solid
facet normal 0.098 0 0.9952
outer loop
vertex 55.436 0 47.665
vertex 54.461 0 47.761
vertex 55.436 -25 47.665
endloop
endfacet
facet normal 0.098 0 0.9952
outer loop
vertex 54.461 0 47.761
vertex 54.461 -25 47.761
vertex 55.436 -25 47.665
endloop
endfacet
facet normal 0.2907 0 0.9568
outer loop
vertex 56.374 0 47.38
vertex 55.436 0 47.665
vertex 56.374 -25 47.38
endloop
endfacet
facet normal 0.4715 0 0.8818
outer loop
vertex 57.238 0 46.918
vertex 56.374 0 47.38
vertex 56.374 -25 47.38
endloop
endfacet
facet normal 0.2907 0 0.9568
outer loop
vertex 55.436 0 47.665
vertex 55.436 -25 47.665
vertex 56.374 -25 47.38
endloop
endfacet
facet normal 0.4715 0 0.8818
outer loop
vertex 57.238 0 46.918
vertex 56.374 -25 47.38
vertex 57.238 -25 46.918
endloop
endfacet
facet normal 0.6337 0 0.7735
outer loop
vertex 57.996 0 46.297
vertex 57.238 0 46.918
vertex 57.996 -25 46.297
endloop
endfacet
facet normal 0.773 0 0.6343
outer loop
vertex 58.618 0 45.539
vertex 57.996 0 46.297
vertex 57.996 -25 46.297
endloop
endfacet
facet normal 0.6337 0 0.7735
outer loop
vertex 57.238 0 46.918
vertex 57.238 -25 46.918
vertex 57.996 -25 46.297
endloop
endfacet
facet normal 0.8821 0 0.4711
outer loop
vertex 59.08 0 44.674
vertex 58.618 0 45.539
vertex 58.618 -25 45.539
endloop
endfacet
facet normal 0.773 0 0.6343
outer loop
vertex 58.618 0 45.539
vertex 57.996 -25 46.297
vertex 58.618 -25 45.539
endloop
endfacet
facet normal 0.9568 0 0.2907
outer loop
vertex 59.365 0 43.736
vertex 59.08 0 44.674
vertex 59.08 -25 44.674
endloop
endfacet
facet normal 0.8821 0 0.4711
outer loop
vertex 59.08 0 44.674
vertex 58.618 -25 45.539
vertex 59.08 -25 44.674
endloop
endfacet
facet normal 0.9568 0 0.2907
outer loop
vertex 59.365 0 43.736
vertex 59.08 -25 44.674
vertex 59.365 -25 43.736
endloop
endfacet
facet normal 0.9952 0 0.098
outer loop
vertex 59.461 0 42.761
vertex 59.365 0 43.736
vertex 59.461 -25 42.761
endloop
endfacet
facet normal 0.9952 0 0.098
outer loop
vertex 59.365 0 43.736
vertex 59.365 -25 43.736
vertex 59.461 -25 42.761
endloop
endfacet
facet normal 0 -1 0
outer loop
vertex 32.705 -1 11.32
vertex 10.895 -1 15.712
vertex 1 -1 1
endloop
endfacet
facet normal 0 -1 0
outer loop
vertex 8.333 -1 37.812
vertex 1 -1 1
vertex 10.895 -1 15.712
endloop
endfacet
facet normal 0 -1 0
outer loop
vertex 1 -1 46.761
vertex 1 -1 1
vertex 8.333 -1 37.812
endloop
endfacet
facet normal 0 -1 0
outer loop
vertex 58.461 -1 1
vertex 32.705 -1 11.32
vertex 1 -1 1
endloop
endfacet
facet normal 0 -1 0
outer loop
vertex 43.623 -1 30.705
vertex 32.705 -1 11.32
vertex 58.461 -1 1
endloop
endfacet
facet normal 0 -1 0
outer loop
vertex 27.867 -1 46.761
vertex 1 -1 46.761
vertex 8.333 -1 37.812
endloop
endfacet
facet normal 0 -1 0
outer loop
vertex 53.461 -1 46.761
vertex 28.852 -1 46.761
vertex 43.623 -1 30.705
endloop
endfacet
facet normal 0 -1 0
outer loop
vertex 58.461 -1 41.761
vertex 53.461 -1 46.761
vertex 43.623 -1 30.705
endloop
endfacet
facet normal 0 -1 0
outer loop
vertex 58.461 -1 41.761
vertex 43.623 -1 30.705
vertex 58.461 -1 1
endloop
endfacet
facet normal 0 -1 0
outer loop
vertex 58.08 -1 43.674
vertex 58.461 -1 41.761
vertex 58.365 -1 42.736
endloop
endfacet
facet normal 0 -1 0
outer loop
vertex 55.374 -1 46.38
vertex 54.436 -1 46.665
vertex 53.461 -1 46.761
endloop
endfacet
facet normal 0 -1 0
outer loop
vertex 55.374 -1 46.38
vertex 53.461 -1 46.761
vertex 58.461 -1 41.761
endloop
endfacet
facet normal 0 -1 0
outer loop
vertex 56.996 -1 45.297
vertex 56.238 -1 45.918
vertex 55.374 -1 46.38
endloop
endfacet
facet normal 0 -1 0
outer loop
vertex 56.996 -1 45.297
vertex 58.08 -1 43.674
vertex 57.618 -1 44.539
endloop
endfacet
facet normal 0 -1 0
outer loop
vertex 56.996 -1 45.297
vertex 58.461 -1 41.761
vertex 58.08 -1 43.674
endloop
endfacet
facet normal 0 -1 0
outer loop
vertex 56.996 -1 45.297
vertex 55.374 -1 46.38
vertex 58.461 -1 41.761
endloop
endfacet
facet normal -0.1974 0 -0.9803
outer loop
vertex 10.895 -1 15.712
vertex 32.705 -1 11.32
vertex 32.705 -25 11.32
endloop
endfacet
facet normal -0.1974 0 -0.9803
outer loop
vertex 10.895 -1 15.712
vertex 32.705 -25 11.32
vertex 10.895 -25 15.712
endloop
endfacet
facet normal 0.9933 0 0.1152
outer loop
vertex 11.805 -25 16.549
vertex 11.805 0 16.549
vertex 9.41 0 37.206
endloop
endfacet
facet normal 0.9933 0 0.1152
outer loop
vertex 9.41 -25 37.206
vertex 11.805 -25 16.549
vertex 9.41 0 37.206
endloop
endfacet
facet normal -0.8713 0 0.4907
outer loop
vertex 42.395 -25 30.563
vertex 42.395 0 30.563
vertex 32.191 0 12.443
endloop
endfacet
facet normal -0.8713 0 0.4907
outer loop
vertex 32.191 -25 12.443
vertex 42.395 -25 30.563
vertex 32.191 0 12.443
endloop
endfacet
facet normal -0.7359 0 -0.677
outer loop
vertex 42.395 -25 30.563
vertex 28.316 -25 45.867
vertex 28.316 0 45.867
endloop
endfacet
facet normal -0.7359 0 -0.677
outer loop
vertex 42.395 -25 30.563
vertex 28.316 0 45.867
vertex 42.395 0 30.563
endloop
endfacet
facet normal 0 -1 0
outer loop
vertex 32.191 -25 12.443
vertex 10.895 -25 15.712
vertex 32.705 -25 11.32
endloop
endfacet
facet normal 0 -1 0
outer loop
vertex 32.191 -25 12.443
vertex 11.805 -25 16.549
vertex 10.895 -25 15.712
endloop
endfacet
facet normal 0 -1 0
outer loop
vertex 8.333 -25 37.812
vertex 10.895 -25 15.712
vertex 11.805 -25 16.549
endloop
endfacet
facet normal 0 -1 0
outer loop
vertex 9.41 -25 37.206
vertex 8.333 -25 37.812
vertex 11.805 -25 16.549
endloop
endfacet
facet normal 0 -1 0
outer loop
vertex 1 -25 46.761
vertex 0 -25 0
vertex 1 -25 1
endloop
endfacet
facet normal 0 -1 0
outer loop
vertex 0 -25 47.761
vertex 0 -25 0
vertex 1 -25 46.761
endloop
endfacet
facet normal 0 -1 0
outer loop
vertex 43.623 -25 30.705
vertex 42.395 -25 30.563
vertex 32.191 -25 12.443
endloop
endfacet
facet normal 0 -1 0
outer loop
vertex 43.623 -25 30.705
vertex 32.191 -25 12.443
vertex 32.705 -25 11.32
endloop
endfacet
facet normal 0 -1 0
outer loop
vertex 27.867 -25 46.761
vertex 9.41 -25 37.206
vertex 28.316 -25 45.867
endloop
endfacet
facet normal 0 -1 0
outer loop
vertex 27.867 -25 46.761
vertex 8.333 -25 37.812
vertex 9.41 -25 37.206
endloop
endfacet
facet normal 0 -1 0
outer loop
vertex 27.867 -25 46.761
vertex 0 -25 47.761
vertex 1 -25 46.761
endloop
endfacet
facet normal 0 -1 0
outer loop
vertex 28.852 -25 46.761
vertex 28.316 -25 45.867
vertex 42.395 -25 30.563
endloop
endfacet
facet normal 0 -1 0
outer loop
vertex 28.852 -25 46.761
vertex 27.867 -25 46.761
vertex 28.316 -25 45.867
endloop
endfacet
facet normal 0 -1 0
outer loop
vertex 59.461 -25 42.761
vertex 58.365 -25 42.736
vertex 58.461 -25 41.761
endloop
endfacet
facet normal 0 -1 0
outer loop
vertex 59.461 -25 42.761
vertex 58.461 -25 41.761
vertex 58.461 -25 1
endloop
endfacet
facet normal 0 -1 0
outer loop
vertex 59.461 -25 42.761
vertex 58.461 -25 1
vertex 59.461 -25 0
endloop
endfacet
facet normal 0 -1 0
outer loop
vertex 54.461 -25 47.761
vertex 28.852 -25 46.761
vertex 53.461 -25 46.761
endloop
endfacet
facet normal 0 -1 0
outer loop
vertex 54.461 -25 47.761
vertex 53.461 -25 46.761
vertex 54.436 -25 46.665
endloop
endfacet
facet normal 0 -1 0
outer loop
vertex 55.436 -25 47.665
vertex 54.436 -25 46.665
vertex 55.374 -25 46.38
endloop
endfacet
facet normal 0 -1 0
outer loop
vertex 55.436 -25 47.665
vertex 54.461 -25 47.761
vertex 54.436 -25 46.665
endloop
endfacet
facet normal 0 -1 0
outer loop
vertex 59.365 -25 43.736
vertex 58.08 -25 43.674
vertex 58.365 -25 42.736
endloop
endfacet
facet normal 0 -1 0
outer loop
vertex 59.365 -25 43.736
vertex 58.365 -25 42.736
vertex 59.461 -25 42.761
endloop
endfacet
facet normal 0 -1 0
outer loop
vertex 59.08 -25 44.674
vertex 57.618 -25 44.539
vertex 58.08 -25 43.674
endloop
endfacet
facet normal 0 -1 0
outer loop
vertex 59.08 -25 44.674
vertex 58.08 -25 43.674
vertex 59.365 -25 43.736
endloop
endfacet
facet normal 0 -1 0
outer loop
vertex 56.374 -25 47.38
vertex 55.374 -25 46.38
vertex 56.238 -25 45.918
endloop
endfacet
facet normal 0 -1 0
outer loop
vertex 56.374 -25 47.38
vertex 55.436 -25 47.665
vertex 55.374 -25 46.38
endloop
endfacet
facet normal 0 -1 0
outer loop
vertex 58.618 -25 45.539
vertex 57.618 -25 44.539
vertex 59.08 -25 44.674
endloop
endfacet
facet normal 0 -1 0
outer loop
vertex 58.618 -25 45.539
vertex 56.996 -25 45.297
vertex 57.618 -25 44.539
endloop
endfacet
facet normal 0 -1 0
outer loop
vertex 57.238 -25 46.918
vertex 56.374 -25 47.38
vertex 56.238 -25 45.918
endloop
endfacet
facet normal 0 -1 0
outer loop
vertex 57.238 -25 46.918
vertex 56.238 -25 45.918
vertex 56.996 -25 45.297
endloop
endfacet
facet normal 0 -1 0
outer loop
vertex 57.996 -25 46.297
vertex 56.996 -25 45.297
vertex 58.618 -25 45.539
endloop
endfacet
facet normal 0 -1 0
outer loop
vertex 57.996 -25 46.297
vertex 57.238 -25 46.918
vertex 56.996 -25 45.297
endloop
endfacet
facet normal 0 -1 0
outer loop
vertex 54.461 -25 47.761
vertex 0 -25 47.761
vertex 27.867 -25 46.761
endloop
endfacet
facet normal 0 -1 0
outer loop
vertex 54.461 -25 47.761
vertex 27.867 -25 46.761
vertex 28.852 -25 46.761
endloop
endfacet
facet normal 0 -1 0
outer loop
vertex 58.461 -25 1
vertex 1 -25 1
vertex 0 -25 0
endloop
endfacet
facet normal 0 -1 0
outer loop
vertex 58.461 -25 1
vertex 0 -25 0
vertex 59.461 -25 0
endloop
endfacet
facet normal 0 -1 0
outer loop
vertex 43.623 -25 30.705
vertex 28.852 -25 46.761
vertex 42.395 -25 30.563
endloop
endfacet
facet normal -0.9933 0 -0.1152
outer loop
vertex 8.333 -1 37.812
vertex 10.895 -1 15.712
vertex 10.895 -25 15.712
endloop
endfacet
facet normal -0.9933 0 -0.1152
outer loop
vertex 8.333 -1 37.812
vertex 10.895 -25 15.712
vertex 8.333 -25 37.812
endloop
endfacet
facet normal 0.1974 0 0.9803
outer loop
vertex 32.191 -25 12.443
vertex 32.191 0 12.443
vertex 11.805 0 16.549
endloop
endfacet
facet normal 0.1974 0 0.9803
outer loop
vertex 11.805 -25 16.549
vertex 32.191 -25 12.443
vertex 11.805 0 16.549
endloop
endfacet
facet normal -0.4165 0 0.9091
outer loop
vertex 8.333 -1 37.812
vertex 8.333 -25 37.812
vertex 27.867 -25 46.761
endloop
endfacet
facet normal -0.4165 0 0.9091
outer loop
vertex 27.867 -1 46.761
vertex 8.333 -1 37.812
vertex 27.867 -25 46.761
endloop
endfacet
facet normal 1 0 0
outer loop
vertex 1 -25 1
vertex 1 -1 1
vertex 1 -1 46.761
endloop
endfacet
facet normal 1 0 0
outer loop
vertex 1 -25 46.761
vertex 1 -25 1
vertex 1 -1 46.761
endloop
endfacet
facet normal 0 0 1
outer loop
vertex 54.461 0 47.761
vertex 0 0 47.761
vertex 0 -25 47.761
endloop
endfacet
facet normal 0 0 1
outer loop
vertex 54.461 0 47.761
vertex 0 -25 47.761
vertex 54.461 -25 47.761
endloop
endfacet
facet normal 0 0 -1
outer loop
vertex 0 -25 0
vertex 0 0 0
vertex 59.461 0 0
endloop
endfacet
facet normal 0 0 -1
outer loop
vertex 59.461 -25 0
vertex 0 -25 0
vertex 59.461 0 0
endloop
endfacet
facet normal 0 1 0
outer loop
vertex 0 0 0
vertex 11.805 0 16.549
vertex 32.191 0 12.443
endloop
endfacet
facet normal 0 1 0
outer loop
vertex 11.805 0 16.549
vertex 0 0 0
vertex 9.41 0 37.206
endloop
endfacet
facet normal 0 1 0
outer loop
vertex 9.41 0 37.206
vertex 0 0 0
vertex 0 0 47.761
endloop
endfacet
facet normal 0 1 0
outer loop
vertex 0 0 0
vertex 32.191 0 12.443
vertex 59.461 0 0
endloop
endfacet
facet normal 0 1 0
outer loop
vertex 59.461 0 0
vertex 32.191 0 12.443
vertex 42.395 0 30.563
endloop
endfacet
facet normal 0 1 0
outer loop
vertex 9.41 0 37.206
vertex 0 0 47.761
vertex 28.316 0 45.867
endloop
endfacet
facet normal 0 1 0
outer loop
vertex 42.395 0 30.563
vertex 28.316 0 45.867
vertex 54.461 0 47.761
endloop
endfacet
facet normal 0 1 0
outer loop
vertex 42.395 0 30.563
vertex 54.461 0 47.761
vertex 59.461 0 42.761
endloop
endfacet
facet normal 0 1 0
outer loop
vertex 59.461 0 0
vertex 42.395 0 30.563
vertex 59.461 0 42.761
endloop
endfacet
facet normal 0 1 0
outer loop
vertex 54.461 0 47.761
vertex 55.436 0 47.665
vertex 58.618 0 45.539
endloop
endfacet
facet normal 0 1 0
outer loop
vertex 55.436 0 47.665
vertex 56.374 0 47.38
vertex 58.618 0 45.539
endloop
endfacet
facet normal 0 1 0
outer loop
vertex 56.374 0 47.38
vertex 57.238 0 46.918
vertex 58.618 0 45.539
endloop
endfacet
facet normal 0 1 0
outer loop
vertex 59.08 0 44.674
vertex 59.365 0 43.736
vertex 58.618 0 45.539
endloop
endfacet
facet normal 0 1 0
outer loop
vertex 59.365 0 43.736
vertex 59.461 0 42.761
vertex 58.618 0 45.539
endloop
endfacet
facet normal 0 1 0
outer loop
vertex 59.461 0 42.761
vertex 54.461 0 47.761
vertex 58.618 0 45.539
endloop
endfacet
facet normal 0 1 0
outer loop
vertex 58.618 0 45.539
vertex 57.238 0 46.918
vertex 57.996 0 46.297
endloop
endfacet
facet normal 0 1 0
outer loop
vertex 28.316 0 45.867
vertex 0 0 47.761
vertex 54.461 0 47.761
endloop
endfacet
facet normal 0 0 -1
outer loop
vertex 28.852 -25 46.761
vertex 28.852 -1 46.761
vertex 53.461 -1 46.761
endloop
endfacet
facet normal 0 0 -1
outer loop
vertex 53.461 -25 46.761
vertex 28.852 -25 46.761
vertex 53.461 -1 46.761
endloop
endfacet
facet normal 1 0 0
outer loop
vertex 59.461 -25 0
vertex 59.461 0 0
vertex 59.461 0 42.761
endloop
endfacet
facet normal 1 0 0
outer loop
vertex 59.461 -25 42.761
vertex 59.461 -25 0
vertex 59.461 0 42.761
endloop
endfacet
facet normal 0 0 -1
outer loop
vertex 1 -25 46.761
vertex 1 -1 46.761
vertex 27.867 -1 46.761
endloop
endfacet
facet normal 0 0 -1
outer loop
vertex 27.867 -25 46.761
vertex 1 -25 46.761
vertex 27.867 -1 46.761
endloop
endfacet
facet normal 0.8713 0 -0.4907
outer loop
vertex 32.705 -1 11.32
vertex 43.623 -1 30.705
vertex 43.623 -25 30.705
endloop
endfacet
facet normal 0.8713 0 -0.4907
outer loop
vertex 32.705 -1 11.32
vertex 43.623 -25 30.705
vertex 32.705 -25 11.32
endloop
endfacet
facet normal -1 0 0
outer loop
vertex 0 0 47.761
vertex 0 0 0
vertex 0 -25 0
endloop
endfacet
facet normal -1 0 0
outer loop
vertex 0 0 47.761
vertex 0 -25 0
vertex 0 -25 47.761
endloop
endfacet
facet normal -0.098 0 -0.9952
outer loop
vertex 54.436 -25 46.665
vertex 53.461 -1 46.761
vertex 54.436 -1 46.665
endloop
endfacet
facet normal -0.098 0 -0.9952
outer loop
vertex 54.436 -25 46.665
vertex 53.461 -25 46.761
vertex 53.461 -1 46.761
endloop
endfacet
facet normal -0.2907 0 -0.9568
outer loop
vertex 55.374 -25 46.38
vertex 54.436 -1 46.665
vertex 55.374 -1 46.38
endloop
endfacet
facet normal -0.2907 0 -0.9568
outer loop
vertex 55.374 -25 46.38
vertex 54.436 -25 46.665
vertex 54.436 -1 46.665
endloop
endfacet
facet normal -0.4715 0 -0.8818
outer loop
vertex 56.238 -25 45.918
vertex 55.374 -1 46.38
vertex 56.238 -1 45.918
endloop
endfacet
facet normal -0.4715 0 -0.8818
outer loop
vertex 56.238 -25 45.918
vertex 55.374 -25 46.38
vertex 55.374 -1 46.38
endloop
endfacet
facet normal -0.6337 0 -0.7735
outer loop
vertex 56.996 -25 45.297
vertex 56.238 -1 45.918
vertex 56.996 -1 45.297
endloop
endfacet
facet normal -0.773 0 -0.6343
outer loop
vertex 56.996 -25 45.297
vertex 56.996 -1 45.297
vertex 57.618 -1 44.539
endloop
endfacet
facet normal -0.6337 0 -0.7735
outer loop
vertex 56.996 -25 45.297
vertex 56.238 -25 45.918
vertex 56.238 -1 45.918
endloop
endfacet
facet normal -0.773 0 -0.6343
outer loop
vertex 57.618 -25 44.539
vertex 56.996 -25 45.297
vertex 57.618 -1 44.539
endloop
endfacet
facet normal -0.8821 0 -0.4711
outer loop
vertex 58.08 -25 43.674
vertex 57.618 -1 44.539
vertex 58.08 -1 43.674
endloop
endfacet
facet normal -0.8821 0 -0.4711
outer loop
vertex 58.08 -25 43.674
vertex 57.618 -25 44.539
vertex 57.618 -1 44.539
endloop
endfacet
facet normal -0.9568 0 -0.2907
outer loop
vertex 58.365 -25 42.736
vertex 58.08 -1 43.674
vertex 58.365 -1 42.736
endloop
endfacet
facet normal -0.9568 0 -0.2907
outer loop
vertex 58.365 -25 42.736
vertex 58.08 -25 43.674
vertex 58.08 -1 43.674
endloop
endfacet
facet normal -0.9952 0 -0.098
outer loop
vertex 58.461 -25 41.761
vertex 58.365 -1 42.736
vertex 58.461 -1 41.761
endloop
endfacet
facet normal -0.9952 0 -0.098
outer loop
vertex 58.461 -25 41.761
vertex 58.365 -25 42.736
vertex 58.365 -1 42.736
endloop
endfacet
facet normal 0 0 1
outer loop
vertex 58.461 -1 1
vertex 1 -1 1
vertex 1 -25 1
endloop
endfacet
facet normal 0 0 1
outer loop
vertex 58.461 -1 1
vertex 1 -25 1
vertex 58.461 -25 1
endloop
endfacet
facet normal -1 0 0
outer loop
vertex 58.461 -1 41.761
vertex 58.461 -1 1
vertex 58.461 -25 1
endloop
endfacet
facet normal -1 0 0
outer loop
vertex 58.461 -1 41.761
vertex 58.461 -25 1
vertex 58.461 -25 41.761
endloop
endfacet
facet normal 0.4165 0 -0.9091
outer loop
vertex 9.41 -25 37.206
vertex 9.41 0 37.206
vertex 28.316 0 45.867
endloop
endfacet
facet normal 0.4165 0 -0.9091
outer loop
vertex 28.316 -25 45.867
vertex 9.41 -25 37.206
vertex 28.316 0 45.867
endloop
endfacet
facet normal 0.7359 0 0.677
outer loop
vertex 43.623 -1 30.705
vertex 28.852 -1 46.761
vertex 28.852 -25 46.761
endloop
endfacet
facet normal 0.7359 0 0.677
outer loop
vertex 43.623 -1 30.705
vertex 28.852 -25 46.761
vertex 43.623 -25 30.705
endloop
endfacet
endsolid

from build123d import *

# Parameters (mm, degrees)
F0_W     = 59.4606287777
F0_H     = 47.7610453963
F1_DEPTH = 25
F2_T     = -1
F3_R     = 5


with BuildPart() as f1:
    # F0 (on Front) → F1 (new body)
    with BuildSketch(Plane.XZ):
        with Locations((29.7303143889, 23.8805226982)):
            Rectangle(F0_W, F0_H)
        Polygon((28.3158866396, 45.8665414289), (42.3948997325, 30.5626016077), (32.1906423503, 12.443486977), (11.8050513651, 16.5491981105), (9.4103206379, 37.2057817696), align=None, mode=Mode.SUBTRACT)
    extrude(amount=F1_DEPTH)

    # F2
    f2_openings = [f1.faces().sort_by_distance(p)[0] for p in [
        (0.762672, -25, 23.880523),
    ]]
    offset(amount=F2_T, openings=f2_openings, kind=Kind.INTERSECTION)

    # F3
    f3_edges = [f1.edges().sort_by_distance(p)[0] for p in [
        (58.460629, -13, 46.761045),
        (59.460629, -12.5, 47.761045),
    ]]
    fillet(f3_edges, radius=F3_R)


solid = f1.part
